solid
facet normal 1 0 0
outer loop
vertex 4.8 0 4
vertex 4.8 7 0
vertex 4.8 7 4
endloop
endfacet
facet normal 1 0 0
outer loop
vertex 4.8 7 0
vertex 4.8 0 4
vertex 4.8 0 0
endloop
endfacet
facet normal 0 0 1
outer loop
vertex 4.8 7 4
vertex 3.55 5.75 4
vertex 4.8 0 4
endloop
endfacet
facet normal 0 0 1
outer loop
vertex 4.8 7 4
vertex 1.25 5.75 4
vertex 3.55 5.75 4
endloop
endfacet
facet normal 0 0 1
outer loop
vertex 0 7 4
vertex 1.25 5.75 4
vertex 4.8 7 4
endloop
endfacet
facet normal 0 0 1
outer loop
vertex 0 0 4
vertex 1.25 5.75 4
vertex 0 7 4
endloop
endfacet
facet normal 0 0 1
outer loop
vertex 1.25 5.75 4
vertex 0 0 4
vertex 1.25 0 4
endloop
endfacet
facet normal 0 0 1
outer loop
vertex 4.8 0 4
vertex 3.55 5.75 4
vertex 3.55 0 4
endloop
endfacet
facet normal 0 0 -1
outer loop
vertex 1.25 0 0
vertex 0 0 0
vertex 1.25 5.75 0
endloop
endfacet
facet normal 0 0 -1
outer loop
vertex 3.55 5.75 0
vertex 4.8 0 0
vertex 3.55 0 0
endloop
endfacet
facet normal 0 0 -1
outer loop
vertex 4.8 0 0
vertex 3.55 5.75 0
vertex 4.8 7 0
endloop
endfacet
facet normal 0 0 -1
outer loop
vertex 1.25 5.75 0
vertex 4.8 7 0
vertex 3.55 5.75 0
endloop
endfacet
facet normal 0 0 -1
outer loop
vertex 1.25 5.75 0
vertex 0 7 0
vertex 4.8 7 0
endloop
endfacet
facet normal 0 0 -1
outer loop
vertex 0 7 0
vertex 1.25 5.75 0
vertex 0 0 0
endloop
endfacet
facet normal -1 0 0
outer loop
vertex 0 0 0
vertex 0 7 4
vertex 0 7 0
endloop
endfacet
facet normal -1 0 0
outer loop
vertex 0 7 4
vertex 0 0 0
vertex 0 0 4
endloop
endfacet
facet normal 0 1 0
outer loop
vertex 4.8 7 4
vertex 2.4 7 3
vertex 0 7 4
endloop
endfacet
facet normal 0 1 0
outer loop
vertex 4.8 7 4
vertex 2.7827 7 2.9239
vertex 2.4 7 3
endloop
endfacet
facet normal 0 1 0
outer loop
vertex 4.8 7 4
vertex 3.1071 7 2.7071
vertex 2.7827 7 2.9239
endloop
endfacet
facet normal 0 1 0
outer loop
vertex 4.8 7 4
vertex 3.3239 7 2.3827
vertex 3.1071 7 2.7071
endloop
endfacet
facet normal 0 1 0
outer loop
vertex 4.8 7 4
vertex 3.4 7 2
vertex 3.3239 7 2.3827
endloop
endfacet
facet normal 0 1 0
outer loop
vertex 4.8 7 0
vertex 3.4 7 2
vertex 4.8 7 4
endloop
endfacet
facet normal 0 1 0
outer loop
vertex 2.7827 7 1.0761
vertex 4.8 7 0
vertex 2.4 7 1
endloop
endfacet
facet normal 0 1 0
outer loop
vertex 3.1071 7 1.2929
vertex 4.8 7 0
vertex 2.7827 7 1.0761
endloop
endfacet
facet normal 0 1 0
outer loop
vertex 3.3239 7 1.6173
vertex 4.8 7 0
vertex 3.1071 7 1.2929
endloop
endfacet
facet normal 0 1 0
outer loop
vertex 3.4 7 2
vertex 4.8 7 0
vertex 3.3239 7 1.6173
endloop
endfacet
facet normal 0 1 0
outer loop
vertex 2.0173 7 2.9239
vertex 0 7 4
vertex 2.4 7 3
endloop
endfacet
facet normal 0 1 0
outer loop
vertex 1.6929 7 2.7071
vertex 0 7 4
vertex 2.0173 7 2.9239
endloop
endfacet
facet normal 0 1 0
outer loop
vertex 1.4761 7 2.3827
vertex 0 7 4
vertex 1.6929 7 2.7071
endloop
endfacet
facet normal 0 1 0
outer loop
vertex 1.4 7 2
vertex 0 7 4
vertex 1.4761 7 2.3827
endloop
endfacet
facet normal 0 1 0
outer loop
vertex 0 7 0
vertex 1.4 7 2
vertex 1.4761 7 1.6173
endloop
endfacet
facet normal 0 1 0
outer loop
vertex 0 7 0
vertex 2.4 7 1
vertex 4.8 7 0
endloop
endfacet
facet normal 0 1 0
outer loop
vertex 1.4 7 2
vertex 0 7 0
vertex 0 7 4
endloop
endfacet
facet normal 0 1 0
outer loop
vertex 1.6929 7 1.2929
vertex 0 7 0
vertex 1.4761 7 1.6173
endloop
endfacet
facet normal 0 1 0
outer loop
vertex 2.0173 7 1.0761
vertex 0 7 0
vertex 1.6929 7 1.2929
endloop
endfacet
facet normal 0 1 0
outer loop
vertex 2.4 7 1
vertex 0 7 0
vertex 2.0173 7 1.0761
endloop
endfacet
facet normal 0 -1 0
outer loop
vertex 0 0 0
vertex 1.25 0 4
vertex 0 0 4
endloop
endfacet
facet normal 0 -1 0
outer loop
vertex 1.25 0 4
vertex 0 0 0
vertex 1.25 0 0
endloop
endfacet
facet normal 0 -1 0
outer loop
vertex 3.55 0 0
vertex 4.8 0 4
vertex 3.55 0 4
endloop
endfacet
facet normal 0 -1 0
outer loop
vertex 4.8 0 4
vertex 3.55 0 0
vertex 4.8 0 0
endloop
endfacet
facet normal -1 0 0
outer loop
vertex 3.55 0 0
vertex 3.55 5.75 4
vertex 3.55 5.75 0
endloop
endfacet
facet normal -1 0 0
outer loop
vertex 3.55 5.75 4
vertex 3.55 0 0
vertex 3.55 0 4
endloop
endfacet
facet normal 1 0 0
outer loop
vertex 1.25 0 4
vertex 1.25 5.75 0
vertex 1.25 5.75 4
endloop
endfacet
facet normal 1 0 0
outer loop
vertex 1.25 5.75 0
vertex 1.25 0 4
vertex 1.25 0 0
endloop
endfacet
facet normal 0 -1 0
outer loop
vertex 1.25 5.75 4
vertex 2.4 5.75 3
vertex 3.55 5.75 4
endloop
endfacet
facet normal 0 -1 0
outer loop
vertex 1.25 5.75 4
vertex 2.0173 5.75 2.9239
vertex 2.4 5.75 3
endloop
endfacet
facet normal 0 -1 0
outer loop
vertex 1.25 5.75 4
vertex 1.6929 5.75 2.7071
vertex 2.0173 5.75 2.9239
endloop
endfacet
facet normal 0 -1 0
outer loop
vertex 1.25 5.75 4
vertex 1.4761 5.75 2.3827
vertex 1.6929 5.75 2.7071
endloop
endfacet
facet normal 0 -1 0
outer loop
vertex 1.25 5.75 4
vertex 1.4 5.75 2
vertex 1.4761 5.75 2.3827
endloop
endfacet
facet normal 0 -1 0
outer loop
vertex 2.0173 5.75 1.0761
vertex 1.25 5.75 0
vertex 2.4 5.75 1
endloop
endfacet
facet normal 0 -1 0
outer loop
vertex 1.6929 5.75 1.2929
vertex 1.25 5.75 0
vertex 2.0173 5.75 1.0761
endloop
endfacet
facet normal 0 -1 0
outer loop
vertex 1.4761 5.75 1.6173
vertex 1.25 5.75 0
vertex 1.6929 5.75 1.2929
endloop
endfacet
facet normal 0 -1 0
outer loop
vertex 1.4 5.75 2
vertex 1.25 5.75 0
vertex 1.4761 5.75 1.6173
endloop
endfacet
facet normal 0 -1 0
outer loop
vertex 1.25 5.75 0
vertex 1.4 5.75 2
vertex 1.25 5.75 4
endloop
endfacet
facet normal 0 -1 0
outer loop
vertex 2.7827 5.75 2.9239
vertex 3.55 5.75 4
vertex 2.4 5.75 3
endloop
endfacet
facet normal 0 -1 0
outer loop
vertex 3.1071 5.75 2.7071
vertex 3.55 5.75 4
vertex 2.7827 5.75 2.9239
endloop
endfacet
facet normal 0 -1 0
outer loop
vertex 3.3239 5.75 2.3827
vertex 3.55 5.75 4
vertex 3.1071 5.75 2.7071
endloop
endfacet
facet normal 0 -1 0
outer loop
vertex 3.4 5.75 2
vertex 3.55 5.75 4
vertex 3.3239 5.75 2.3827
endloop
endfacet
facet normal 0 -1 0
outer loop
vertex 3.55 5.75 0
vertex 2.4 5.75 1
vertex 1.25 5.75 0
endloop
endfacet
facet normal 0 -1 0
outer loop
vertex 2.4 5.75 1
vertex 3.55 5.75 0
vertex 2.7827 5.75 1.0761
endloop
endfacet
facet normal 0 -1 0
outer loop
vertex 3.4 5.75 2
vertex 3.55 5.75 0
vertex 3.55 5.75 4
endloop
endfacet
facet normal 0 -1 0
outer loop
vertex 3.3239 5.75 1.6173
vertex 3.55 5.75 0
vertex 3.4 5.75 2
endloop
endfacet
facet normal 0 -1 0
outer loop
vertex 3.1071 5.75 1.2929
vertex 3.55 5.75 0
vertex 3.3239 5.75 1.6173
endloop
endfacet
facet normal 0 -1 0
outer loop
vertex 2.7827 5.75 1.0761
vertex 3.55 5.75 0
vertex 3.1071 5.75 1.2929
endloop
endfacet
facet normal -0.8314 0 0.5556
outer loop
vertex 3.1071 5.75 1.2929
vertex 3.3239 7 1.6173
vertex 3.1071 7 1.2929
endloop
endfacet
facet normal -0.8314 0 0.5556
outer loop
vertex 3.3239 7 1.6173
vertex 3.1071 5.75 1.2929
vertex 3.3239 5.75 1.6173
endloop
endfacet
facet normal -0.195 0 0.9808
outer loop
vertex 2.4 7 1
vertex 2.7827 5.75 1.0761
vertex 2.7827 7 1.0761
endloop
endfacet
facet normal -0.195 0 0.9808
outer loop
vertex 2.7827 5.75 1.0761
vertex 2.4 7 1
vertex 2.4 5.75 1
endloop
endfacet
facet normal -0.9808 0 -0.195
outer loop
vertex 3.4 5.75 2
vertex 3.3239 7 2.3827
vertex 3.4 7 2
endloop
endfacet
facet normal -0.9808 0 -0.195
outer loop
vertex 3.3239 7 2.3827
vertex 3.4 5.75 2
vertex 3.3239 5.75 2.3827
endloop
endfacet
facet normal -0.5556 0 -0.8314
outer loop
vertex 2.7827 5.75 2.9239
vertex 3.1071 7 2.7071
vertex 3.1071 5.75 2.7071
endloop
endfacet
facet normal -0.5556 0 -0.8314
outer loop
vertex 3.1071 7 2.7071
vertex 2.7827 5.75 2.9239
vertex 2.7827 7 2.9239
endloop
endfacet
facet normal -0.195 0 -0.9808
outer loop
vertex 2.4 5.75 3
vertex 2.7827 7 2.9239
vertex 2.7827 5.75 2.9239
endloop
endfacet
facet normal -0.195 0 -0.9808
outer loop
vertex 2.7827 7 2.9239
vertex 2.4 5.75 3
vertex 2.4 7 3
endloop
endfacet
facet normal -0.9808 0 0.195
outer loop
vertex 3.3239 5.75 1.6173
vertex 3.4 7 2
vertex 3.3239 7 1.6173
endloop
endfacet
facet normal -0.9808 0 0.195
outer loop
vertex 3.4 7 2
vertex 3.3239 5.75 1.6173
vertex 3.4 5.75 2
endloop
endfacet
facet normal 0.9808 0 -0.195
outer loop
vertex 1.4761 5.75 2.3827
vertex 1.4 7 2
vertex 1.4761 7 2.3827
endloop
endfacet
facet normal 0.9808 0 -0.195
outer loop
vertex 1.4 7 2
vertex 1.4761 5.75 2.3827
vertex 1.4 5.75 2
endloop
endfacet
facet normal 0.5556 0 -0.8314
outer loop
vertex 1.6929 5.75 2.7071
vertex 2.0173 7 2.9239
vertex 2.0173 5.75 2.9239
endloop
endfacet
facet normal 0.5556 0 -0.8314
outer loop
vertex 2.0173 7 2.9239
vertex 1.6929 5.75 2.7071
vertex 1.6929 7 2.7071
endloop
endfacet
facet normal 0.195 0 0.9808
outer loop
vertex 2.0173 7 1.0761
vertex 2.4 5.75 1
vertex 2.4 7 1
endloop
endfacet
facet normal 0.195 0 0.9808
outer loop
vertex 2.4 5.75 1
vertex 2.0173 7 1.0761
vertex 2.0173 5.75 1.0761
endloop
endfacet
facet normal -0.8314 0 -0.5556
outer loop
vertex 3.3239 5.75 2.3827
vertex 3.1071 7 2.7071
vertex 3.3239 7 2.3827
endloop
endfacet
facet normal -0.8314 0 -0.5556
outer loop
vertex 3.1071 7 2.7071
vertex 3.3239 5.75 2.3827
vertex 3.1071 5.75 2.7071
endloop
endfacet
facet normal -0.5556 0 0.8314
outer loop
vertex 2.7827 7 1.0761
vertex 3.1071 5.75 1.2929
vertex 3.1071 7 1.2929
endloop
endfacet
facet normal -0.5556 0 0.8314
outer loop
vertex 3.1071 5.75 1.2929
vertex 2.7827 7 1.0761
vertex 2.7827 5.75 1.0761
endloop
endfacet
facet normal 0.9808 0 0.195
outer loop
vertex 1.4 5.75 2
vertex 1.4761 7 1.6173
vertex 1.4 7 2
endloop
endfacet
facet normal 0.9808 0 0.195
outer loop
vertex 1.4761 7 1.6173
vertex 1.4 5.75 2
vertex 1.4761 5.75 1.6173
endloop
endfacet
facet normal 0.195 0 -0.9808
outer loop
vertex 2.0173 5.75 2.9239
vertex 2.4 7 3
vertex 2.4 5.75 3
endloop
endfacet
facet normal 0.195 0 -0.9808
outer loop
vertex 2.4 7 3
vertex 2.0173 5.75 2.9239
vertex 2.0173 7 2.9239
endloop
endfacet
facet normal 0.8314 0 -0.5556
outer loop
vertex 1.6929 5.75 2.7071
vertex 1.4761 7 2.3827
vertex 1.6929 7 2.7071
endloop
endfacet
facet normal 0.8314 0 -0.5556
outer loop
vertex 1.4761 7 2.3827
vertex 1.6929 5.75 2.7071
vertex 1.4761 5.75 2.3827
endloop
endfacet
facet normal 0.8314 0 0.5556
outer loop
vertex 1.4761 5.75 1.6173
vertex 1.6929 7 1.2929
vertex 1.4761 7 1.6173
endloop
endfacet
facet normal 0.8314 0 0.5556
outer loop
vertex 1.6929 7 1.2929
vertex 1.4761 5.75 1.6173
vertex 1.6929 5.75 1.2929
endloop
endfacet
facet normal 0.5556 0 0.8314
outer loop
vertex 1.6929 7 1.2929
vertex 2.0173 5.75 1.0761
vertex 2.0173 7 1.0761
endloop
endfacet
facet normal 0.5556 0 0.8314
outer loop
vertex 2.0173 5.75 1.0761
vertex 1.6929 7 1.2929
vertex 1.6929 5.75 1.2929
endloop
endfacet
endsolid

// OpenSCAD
wall = 1.25;
slit = 2.3;
depth = 7;
height = 4;
hole = 2;

$fn = 16;

difference() {
    cube([2*wall+slit,depth,height]);
    translate([wall,-wall,-height]) #cube([slit,depth,height*3]);
    translate([wall+slit/2,0,height/2]) rotate([90,0,0]) cylinder(h=100,d=hole,center=true);
}
